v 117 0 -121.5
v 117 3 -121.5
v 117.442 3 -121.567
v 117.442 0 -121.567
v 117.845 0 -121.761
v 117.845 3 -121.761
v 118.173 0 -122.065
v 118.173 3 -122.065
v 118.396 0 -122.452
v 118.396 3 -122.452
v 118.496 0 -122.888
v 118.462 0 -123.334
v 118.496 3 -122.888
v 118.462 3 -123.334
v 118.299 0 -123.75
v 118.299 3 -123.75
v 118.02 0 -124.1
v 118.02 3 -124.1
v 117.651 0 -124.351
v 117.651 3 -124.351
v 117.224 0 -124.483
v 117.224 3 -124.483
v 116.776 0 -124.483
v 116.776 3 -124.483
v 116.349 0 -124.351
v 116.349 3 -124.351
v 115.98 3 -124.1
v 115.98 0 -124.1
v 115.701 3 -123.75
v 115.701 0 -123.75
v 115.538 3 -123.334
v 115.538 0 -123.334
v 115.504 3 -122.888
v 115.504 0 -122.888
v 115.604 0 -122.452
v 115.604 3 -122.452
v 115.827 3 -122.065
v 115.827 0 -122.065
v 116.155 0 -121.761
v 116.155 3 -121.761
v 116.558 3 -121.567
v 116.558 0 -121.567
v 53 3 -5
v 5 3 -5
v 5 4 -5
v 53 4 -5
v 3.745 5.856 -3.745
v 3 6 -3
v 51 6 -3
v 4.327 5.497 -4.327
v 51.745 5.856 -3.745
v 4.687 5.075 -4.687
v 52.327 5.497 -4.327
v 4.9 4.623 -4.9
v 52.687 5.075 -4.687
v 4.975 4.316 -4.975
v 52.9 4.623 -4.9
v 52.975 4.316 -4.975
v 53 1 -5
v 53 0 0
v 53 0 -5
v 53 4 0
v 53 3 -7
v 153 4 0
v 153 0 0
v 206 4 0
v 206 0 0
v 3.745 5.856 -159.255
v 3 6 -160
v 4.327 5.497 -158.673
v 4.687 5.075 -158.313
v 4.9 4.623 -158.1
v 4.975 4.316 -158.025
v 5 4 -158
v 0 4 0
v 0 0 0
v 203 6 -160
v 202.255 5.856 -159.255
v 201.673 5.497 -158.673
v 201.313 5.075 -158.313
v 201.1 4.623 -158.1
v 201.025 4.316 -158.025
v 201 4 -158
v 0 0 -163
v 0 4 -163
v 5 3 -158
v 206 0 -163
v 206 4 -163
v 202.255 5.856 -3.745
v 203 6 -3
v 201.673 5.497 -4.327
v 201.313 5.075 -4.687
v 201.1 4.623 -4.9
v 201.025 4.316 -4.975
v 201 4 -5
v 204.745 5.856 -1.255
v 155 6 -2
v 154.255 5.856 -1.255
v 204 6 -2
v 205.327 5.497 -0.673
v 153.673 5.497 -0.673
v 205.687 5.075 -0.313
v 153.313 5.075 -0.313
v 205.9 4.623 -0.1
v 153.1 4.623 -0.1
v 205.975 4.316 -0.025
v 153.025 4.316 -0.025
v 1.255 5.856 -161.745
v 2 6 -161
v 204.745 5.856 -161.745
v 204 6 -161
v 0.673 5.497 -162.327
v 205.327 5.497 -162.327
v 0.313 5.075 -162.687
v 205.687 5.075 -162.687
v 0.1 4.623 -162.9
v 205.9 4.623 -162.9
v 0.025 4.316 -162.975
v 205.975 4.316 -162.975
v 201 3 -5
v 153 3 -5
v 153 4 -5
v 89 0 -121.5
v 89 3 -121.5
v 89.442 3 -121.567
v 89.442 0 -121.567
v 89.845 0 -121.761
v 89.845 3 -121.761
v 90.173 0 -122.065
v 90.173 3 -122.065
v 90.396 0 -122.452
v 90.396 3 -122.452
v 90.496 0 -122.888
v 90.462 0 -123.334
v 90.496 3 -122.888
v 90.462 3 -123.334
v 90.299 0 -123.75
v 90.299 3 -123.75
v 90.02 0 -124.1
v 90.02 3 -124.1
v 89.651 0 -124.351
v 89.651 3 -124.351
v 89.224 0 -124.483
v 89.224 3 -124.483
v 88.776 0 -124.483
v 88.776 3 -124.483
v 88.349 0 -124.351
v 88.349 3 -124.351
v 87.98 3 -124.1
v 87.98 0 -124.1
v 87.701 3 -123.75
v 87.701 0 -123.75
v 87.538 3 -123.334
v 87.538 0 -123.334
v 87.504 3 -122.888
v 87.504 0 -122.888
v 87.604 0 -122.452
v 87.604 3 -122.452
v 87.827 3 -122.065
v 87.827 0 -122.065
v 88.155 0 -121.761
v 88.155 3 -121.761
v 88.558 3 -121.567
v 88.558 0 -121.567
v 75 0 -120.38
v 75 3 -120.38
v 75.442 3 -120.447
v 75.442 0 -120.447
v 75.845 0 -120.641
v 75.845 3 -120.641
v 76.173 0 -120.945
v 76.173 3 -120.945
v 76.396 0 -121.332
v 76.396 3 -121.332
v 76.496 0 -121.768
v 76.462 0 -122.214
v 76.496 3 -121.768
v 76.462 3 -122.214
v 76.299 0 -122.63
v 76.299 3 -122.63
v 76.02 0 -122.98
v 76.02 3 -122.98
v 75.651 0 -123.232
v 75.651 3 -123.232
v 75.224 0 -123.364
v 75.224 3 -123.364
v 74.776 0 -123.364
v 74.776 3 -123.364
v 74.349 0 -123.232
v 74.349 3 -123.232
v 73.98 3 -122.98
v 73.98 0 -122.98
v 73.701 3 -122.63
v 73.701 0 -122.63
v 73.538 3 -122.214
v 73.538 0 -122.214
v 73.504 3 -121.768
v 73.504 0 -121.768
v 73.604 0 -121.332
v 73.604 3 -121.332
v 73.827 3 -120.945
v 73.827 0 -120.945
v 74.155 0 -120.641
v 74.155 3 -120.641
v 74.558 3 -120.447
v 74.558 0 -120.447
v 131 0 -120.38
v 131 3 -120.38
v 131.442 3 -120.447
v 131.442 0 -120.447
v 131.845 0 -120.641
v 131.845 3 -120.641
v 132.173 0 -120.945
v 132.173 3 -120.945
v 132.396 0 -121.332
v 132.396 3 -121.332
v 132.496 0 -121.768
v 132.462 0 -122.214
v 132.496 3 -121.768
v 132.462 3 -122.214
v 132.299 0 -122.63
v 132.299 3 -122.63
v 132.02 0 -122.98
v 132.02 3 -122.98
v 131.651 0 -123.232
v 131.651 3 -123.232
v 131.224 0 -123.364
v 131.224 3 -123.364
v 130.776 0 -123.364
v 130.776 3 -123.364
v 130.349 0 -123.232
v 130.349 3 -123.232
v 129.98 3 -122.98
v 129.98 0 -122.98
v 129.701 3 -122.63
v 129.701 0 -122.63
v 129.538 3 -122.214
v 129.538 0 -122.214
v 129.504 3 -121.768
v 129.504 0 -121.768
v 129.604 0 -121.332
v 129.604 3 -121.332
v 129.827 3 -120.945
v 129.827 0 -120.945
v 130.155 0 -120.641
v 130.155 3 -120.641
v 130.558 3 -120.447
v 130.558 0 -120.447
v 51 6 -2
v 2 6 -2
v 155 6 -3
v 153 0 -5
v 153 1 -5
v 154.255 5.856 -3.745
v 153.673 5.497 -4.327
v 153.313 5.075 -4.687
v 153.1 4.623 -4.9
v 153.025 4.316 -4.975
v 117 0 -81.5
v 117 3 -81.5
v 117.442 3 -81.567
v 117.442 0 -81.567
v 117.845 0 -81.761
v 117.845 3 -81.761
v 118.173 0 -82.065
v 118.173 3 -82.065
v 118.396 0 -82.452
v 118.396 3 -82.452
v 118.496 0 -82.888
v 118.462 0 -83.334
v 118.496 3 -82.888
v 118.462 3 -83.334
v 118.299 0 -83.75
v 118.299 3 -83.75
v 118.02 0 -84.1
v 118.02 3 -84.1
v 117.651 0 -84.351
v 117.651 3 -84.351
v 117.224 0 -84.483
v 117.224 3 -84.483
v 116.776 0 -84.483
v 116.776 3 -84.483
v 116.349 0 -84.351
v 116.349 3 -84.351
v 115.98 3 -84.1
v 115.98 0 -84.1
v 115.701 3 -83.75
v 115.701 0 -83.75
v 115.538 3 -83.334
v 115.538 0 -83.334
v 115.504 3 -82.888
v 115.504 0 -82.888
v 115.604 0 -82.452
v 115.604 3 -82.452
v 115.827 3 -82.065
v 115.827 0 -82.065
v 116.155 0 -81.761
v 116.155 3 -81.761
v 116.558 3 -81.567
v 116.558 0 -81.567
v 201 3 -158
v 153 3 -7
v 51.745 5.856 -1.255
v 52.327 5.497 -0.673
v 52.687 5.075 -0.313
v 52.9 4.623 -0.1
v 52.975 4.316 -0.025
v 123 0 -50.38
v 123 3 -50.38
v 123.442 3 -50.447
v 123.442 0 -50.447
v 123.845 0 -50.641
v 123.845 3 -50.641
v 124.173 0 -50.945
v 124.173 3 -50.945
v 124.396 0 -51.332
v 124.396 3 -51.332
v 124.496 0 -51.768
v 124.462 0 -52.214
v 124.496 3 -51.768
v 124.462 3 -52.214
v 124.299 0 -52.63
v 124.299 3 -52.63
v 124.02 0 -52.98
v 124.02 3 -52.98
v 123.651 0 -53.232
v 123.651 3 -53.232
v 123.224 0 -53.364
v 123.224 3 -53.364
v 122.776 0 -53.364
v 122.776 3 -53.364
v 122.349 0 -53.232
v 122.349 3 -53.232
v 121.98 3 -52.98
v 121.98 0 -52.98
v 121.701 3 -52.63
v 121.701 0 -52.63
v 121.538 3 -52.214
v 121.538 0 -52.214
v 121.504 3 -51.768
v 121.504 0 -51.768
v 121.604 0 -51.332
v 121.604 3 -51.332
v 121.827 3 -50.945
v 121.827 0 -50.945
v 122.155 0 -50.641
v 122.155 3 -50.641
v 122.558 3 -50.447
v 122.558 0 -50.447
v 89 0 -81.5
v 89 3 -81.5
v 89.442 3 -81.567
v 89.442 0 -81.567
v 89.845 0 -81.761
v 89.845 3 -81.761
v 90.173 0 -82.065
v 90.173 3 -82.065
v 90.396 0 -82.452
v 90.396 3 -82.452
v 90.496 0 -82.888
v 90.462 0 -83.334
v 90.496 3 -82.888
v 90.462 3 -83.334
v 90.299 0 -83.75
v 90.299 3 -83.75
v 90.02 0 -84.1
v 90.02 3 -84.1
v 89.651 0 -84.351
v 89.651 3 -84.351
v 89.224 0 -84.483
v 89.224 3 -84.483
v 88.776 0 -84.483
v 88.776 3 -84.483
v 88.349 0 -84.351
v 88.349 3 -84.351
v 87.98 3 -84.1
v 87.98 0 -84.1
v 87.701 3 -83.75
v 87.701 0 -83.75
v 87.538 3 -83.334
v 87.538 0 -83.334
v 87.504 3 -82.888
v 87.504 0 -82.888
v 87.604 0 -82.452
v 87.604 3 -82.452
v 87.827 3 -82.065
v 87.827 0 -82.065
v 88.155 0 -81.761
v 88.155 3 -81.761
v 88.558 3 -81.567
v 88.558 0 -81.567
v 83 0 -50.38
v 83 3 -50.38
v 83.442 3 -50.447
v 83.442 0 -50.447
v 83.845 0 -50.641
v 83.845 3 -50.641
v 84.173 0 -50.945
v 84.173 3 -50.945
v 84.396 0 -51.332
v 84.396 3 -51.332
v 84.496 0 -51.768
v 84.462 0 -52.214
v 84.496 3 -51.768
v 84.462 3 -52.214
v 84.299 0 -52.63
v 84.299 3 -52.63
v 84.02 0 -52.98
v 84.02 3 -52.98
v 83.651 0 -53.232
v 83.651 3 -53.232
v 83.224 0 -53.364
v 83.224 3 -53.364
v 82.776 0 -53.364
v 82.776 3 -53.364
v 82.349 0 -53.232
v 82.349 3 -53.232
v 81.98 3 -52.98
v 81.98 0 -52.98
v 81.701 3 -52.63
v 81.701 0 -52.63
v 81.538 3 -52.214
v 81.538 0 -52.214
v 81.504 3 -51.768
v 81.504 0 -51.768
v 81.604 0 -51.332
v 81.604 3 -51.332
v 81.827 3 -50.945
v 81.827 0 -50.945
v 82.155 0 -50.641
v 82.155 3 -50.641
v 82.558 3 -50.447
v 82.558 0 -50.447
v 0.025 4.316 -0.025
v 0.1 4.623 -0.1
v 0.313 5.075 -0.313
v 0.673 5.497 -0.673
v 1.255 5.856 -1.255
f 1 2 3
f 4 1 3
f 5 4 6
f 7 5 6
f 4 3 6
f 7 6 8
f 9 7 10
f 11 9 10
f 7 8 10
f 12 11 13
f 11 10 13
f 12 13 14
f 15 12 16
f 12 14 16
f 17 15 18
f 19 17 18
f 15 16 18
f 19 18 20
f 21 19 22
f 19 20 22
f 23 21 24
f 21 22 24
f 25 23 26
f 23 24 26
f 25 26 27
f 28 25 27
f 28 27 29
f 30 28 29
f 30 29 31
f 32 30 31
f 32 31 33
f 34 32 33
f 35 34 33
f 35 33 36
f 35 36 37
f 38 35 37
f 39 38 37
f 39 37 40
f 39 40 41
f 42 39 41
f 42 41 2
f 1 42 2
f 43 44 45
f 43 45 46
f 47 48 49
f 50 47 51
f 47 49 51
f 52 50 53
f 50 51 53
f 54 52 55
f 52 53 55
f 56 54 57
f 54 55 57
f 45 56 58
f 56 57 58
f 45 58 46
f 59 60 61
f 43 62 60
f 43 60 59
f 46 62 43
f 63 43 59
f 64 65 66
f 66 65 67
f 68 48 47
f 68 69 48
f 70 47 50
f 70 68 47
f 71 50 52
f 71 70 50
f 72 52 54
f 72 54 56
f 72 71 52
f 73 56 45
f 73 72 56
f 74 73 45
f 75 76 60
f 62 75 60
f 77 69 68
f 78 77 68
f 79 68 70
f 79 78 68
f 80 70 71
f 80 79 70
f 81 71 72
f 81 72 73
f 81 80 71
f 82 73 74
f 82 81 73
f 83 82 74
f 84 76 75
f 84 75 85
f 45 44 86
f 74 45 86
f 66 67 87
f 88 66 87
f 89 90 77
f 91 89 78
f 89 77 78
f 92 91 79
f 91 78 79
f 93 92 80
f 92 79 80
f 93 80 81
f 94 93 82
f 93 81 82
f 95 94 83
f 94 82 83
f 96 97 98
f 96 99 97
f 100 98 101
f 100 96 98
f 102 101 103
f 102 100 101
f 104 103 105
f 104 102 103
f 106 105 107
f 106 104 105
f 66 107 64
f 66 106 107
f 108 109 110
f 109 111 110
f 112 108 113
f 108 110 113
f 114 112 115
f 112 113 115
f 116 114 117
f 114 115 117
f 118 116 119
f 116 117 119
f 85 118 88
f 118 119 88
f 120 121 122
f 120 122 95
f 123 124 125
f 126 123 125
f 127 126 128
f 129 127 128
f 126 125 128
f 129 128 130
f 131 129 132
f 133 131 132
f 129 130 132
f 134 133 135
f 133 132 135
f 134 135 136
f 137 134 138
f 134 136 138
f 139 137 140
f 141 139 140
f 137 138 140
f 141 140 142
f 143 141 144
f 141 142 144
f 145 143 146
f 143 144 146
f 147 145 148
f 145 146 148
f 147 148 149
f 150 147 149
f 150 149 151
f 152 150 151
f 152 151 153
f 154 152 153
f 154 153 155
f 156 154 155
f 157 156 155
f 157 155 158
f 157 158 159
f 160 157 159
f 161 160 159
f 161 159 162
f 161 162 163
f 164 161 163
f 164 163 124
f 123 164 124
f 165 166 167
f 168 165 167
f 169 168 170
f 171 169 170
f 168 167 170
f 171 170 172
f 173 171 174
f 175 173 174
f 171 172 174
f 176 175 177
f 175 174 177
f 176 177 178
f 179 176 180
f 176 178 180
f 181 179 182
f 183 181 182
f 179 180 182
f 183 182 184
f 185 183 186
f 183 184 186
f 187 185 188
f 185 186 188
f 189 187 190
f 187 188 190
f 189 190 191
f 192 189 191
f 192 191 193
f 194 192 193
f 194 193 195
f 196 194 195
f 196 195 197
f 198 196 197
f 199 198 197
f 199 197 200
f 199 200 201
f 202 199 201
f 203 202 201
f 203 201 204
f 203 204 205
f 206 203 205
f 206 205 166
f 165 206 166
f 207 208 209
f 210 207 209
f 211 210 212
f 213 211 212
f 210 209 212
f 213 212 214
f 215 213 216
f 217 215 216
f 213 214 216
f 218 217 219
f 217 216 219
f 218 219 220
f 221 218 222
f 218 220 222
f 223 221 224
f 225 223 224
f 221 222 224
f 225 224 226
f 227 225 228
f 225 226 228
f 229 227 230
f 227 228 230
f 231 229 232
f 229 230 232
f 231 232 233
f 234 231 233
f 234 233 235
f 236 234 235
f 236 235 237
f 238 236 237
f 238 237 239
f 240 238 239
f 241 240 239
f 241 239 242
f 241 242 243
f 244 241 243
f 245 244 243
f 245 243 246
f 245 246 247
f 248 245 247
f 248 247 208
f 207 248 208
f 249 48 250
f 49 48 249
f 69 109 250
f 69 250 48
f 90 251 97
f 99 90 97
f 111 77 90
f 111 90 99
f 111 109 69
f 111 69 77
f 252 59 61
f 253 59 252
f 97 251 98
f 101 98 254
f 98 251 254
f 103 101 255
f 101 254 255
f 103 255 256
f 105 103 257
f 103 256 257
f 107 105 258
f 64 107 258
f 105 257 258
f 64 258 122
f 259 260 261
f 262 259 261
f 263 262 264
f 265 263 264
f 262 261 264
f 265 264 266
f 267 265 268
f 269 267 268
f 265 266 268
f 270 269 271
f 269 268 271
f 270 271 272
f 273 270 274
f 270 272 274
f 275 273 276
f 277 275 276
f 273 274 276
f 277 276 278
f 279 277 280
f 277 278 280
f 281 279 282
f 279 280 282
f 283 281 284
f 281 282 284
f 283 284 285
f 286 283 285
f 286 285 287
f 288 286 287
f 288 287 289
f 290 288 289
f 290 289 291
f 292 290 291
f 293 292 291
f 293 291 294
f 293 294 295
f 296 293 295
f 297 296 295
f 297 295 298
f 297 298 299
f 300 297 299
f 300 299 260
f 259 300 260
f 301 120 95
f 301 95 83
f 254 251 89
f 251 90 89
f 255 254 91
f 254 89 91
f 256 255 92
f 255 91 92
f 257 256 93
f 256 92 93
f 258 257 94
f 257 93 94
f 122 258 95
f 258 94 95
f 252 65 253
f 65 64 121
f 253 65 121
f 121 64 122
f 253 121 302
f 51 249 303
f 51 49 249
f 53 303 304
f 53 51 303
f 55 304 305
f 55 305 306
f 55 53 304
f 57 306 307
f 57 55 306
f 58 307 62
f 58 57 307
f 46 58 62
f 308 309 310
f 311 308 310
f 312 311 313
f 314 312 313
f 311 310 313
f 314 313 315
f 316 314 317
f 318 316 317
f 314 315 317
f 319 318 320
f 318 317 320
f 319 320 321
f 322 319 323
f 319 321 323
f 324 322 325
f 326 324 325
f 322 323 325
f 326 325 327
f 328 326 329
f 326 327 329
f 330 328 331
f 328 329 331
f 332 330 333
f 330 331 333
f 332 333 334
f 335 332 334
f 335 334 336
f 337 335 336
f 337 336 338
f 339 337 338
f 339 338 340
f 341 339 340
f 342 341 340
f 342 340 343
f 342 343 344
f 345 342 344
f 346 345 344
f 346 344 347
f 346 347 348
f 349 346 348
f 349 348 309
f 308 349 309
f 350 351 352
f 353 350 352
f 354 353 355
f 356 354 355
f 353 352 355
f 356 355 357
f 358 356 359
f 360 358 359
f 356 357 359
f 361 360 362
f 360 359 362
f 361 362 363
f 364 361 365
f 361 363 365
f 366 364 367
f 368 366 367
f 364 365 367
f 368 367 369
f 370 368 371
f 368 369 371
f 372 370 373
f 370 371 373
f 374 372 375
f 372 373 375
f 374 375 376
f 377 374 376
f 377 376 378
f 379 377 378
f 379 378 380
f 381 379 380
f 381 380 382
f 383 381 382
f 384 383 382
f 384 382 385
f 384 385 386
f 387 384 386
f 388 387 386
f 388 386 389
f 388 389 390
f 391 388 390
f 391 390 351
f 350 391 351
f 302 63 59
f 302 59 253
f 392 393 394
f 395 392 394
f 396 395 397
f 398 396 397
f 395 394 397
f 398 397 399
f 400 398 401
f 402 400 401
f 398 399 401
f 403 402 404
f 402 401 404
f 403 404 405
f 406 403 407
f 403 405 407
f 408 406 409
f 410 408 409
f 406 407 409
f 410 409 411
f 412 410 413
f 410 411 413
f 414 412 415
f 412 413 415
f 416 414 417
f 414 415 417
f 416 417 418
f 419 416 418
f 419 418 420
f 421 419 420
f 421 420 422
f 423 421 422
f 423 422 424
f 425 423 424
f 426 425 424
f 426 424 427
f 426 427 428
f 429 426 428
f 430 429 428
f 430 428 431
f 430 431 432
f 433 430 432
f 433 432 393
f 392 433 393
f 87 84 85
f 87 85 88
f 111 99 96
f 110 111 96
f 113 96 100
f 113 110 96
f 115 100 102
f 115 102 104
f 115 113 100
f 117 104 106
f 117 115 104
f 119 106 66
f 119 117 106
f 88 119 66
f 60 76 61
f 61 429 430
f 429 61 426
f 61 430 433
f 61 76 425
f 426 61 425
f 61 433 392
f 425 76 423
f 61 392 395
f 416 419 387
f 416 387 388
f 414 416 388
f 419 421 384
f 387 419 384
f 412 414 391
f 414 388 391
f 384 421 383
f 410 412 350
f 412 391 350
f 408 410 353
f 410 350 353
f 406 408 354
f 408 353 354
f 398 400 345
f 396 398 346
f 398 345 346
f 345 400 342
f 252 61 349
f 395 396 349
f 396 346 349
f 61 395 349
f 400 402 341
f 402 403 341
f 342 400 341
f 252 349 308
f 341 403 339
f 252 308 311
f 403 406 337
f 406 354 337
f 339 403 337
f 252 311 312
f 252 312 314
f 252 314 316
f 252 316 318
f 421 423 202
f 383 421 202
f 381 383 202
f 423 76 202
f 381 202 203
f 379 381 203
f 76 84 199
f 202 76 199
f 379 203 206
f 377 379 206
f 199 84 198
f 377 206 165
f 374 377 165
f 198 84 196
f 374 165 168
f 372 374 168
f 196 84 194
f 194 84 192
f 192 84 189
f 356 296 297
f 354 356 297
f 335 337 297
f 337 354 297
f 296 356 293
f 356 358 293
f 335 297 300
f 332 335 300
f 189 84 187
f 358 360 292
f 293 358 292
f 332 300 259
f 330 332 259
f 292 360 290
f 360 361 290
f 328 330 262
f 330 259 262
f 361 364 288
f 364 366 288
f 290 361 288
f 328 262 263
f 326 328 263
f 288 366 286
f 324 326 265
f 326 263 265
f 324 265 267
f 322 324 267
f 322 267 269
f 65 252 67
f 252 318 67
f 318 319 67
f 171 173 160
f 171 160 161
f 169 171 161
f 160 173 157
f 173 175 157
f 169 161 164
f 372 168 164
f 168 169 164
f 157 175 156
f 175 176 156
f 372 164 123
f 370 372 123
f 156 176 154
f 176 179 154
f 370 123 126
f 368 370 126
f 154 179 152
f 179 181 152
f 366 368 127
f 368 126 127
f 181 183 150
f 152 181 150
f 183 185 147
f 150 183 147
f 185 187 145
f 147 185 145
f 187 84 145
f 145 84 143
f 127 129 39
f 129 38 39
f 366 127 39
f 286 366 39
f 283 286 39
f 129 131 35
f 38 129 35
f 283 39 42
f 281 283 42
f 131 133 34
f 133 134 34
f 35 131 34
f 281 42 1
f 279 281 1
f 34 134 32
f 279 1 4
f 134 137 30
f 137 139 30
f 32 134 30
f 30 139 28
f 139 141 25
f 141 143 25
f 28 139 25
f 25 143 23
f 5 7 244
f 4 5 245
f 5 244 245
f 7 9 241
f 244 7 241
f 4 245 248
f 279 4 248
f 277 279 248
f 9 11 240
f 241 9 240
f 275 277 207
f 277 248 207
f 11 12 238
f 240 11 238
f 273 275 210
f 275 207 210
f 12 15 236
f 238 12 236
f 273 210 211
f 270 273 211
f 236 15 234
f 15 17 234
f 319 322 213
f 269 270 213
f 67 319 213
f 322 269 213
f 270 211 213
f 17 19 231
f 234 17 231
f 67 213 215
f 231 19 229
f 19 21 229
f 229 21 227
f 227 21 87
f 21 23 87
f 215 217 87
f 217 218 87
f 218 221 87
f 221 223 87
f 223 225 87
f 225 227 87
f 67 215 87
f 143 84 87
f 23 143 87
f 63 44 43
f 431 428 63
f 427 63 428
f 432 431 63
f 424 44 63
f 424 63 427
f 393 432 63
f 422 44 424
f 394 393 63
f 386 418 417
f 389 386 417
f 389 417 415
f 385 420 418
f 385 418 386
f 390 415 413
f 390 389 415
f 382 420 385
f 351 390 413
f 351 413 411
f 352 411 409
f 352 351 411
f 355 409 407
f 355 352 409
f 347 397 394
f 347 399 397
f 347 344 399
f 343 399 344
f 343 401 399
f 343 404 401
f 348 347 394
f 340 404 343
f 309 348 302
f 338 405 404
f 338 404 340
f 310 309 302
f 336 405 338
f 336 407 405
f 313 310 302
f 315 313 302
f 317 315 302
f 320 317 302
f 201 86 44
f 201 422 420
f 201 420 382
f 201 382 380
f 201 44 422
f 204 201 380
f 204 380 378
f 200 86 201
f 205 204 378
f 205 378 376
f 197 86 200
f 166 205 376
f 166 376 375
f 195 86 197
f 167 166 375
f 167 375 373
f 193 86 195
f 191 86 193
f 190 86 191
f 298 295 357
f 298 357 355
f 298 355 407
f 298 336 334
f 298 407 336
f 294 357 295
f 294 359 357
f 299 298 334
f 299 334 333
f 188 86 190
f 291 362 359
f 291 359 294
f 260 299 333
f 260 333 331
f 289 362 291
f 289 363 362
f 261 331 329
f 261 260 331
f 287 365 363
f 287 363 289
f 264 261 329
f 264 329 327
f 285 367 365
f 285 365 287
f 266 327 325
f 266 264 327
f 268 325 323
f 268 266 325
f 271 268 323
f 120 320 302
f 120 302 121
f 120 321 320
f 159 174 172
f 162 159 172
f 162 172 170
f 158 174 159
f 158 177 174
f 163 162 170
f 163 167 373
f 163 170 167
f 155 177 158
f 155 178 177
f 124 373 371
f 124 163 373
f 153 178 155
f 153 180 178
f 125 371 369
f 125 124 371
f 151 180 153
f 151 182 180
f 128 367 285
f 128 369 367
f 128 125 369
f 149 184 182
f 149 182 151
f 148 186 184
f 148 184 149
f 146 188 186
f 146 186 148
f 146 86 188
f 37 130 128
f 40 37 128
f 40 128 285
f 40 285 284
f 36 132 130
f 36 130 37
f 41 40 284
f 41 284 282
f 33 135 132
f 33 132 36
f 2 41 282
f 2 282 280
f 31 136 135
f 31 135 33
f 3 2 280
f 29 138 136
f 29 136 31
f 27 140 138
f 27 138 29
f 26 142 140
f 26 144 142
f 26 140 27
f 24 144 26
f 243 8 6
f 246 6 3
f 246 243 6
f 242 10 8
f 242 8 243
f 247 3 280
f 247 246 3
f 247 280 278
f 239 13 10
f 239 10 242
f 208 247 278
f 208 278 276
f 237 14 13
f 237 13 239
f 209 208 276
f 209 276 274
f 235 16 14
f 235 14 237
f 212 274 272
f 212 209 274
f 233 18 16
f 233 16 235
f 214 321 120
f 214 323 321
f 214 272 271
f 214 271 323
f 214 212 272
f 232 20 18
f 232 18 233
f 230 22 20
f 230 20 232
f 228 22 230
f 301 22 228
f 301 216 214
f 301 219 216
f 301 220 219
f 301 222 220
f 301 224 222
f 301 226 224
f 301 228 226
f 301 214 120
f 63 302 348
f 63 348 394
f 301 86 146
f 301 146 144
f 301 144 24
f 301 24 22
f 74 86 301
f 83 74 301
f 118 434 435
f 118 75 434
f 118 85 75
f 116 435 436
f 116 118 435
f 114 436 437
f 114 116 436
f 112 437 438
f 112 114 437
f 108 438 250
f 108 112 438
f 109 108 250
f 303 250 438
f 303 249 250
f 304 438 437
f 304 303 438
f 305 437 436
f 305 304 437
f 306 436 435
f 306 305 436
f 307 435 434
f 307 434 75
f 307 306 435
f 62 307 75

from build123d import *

# Parameters (mm, degrees)
CROQUIS1_W              = 206
CROQUIS1_H              = 163
SALIENTE_EXTRUIR1_DEPTH = 3
CROQUIS2_W              = 206
CROQUIS2_H              = 163
CROQUIS2_W_2            = 196
CROQUIS2_H_2            = 153
SALIENTE_EXTRUIR2_DEPTH = 3
CROQUIS3_W              = 100
CROQUIS3_H              = 5
CORTAR_EXTRUIR1_DEPTH   = 10
REDONDEO2_R             = 2
CHAFL_N1_SIZE           = 2
CROQUIS4_R              = 1.5
CORTAR_EXTRUIR3_DEPTH   = 10
CROQUIS5_R              = 1.5
CORTAR_EXTRUIR4_DEPTH   = 10


with BuildPart() as part:
    # Croquis1 → Saliente-Extruir1 (new body)
    with BuildSketch(Plane(origin=(0, 0, 0), x_dir=(1, 0, 0), z_dir=(0, 1, 0))):
        with Locations((103, 81.5)):
            Rectangle(CROQUIS1_W, CROQUIS1_H)
    extrude(amount=SALIENTE_EXTRUIR1_DEPTH)

    # Croquis2 → Saliente-Extruir2 (add)
    with BuildSketch(Plane(origin=(0, 3, 0), x_dir=(1, 0, 0), z_dir=(0, 1, 0))):
        with Locations((103, 81.5)):
            Rectangle(CROQUIS2_W, CROQUIS2_H)
        with Locations((103, 81.5)):
            Rectangle(CROQUIS2_W_2, CROQUIS2_H_2, mode=Mode.SUBTRACT)
    extrude(amount=SALIENTE_EXTRUIR2_DEPTH)

    # Croquis3 → Cortar-Extruir1 (cut)
    with BuildSketch(Plane(origin=(0, 6, 0), x_dir=(1, 0, 0), z_dir=(0, 1, 0))):
        with Locations((103, 2.5)):
            Rectangle(CROQUIS3_W, CROQUIS3_H)
    extrude(amount=-CORTAR_EXTRUIR1_DEPTH, mode=Mode.SUBTRACT)

    # Redondeo2
    redondeo2_edges = [part.edges().sort_by_distance(p)[0] for p in [
        (103, 6, -163),
        (26.5, 6, 0),
        (0, 6, -81.5),
        (201, 6, -81.5),
        (103, 6, -158),
        (5, 6, -81.5),
        (206, 6, -81.5),
        (29, 6, -5),
        (177, 6, -5),
        (179.5, 6, 0),
        (53, 6, -2.5),
        (153, 6, -2.5),
    ]]
    fillet(redondeo2_edges, radius=REDONDEO2_R)

    # Chaflán1
    chafl_n1_edges = [part.edges().sort_by_distance(p)[0] for p in [
        (103, 3, -5),
    ]]
    chamfer(chafl_n1_edges, length=CHAFL_N1_SIZE)

    # Croquis4 → Cortar-Extruir3 (cut)
    with BuildSketch(Plane(origin=(0, 3, 0), x_dir=(1, 0, 0), z_dir=(0, 1, 0))):
        with Locations(Location((123, 51.88030089, 0), (0, 0, 270))):
            Circle(CROQUIS4_R)
        with Locations(Location((83, 51.88030089, 0), (0, 0, 270))):
            Circle(CROQUIS4_R)
        with Locations(Location((75, 121.88030089, 0), (0, 0, 270))):
            Circle(CROQUIS4_R)
        with Locations(Location((131, 121.88030089, 0), (0, 0, 270))):
            Circle(CROQUIS4_R)
    extrude(amount=-CORTAR_EXTRUIR3_DEPTH, mode=Mode.SUBTRACT)

    # Croquis5 → Cortar-Extruir4 (cut)
    with BuildSketch(Plane(origin=(0, 3, 0), x_dir=(1, 0, 0), z_dir=(0, 1, 0))):
        with Locations(Location((89, 123, 0), (0, 0, 270))):
            Circle(CROQUIS5_R)
        with Locations(Location((117, 123, 0), (0, 0, 270))):
            Circle(CROQUIS5_R)
        with Locations(Location((89, 83, 0), (0, 0, 270))):
            Circle(CROQUIS5_R)
        with Locations(Location((117, 83, 0), (0, 0, 270))):
            Circle(CROQUIS5_R)
    extrude(amount=-CORTAR_EXTRUIR4_DEPTH, mode=Mode.SUBTRACT)


solid = part.part
